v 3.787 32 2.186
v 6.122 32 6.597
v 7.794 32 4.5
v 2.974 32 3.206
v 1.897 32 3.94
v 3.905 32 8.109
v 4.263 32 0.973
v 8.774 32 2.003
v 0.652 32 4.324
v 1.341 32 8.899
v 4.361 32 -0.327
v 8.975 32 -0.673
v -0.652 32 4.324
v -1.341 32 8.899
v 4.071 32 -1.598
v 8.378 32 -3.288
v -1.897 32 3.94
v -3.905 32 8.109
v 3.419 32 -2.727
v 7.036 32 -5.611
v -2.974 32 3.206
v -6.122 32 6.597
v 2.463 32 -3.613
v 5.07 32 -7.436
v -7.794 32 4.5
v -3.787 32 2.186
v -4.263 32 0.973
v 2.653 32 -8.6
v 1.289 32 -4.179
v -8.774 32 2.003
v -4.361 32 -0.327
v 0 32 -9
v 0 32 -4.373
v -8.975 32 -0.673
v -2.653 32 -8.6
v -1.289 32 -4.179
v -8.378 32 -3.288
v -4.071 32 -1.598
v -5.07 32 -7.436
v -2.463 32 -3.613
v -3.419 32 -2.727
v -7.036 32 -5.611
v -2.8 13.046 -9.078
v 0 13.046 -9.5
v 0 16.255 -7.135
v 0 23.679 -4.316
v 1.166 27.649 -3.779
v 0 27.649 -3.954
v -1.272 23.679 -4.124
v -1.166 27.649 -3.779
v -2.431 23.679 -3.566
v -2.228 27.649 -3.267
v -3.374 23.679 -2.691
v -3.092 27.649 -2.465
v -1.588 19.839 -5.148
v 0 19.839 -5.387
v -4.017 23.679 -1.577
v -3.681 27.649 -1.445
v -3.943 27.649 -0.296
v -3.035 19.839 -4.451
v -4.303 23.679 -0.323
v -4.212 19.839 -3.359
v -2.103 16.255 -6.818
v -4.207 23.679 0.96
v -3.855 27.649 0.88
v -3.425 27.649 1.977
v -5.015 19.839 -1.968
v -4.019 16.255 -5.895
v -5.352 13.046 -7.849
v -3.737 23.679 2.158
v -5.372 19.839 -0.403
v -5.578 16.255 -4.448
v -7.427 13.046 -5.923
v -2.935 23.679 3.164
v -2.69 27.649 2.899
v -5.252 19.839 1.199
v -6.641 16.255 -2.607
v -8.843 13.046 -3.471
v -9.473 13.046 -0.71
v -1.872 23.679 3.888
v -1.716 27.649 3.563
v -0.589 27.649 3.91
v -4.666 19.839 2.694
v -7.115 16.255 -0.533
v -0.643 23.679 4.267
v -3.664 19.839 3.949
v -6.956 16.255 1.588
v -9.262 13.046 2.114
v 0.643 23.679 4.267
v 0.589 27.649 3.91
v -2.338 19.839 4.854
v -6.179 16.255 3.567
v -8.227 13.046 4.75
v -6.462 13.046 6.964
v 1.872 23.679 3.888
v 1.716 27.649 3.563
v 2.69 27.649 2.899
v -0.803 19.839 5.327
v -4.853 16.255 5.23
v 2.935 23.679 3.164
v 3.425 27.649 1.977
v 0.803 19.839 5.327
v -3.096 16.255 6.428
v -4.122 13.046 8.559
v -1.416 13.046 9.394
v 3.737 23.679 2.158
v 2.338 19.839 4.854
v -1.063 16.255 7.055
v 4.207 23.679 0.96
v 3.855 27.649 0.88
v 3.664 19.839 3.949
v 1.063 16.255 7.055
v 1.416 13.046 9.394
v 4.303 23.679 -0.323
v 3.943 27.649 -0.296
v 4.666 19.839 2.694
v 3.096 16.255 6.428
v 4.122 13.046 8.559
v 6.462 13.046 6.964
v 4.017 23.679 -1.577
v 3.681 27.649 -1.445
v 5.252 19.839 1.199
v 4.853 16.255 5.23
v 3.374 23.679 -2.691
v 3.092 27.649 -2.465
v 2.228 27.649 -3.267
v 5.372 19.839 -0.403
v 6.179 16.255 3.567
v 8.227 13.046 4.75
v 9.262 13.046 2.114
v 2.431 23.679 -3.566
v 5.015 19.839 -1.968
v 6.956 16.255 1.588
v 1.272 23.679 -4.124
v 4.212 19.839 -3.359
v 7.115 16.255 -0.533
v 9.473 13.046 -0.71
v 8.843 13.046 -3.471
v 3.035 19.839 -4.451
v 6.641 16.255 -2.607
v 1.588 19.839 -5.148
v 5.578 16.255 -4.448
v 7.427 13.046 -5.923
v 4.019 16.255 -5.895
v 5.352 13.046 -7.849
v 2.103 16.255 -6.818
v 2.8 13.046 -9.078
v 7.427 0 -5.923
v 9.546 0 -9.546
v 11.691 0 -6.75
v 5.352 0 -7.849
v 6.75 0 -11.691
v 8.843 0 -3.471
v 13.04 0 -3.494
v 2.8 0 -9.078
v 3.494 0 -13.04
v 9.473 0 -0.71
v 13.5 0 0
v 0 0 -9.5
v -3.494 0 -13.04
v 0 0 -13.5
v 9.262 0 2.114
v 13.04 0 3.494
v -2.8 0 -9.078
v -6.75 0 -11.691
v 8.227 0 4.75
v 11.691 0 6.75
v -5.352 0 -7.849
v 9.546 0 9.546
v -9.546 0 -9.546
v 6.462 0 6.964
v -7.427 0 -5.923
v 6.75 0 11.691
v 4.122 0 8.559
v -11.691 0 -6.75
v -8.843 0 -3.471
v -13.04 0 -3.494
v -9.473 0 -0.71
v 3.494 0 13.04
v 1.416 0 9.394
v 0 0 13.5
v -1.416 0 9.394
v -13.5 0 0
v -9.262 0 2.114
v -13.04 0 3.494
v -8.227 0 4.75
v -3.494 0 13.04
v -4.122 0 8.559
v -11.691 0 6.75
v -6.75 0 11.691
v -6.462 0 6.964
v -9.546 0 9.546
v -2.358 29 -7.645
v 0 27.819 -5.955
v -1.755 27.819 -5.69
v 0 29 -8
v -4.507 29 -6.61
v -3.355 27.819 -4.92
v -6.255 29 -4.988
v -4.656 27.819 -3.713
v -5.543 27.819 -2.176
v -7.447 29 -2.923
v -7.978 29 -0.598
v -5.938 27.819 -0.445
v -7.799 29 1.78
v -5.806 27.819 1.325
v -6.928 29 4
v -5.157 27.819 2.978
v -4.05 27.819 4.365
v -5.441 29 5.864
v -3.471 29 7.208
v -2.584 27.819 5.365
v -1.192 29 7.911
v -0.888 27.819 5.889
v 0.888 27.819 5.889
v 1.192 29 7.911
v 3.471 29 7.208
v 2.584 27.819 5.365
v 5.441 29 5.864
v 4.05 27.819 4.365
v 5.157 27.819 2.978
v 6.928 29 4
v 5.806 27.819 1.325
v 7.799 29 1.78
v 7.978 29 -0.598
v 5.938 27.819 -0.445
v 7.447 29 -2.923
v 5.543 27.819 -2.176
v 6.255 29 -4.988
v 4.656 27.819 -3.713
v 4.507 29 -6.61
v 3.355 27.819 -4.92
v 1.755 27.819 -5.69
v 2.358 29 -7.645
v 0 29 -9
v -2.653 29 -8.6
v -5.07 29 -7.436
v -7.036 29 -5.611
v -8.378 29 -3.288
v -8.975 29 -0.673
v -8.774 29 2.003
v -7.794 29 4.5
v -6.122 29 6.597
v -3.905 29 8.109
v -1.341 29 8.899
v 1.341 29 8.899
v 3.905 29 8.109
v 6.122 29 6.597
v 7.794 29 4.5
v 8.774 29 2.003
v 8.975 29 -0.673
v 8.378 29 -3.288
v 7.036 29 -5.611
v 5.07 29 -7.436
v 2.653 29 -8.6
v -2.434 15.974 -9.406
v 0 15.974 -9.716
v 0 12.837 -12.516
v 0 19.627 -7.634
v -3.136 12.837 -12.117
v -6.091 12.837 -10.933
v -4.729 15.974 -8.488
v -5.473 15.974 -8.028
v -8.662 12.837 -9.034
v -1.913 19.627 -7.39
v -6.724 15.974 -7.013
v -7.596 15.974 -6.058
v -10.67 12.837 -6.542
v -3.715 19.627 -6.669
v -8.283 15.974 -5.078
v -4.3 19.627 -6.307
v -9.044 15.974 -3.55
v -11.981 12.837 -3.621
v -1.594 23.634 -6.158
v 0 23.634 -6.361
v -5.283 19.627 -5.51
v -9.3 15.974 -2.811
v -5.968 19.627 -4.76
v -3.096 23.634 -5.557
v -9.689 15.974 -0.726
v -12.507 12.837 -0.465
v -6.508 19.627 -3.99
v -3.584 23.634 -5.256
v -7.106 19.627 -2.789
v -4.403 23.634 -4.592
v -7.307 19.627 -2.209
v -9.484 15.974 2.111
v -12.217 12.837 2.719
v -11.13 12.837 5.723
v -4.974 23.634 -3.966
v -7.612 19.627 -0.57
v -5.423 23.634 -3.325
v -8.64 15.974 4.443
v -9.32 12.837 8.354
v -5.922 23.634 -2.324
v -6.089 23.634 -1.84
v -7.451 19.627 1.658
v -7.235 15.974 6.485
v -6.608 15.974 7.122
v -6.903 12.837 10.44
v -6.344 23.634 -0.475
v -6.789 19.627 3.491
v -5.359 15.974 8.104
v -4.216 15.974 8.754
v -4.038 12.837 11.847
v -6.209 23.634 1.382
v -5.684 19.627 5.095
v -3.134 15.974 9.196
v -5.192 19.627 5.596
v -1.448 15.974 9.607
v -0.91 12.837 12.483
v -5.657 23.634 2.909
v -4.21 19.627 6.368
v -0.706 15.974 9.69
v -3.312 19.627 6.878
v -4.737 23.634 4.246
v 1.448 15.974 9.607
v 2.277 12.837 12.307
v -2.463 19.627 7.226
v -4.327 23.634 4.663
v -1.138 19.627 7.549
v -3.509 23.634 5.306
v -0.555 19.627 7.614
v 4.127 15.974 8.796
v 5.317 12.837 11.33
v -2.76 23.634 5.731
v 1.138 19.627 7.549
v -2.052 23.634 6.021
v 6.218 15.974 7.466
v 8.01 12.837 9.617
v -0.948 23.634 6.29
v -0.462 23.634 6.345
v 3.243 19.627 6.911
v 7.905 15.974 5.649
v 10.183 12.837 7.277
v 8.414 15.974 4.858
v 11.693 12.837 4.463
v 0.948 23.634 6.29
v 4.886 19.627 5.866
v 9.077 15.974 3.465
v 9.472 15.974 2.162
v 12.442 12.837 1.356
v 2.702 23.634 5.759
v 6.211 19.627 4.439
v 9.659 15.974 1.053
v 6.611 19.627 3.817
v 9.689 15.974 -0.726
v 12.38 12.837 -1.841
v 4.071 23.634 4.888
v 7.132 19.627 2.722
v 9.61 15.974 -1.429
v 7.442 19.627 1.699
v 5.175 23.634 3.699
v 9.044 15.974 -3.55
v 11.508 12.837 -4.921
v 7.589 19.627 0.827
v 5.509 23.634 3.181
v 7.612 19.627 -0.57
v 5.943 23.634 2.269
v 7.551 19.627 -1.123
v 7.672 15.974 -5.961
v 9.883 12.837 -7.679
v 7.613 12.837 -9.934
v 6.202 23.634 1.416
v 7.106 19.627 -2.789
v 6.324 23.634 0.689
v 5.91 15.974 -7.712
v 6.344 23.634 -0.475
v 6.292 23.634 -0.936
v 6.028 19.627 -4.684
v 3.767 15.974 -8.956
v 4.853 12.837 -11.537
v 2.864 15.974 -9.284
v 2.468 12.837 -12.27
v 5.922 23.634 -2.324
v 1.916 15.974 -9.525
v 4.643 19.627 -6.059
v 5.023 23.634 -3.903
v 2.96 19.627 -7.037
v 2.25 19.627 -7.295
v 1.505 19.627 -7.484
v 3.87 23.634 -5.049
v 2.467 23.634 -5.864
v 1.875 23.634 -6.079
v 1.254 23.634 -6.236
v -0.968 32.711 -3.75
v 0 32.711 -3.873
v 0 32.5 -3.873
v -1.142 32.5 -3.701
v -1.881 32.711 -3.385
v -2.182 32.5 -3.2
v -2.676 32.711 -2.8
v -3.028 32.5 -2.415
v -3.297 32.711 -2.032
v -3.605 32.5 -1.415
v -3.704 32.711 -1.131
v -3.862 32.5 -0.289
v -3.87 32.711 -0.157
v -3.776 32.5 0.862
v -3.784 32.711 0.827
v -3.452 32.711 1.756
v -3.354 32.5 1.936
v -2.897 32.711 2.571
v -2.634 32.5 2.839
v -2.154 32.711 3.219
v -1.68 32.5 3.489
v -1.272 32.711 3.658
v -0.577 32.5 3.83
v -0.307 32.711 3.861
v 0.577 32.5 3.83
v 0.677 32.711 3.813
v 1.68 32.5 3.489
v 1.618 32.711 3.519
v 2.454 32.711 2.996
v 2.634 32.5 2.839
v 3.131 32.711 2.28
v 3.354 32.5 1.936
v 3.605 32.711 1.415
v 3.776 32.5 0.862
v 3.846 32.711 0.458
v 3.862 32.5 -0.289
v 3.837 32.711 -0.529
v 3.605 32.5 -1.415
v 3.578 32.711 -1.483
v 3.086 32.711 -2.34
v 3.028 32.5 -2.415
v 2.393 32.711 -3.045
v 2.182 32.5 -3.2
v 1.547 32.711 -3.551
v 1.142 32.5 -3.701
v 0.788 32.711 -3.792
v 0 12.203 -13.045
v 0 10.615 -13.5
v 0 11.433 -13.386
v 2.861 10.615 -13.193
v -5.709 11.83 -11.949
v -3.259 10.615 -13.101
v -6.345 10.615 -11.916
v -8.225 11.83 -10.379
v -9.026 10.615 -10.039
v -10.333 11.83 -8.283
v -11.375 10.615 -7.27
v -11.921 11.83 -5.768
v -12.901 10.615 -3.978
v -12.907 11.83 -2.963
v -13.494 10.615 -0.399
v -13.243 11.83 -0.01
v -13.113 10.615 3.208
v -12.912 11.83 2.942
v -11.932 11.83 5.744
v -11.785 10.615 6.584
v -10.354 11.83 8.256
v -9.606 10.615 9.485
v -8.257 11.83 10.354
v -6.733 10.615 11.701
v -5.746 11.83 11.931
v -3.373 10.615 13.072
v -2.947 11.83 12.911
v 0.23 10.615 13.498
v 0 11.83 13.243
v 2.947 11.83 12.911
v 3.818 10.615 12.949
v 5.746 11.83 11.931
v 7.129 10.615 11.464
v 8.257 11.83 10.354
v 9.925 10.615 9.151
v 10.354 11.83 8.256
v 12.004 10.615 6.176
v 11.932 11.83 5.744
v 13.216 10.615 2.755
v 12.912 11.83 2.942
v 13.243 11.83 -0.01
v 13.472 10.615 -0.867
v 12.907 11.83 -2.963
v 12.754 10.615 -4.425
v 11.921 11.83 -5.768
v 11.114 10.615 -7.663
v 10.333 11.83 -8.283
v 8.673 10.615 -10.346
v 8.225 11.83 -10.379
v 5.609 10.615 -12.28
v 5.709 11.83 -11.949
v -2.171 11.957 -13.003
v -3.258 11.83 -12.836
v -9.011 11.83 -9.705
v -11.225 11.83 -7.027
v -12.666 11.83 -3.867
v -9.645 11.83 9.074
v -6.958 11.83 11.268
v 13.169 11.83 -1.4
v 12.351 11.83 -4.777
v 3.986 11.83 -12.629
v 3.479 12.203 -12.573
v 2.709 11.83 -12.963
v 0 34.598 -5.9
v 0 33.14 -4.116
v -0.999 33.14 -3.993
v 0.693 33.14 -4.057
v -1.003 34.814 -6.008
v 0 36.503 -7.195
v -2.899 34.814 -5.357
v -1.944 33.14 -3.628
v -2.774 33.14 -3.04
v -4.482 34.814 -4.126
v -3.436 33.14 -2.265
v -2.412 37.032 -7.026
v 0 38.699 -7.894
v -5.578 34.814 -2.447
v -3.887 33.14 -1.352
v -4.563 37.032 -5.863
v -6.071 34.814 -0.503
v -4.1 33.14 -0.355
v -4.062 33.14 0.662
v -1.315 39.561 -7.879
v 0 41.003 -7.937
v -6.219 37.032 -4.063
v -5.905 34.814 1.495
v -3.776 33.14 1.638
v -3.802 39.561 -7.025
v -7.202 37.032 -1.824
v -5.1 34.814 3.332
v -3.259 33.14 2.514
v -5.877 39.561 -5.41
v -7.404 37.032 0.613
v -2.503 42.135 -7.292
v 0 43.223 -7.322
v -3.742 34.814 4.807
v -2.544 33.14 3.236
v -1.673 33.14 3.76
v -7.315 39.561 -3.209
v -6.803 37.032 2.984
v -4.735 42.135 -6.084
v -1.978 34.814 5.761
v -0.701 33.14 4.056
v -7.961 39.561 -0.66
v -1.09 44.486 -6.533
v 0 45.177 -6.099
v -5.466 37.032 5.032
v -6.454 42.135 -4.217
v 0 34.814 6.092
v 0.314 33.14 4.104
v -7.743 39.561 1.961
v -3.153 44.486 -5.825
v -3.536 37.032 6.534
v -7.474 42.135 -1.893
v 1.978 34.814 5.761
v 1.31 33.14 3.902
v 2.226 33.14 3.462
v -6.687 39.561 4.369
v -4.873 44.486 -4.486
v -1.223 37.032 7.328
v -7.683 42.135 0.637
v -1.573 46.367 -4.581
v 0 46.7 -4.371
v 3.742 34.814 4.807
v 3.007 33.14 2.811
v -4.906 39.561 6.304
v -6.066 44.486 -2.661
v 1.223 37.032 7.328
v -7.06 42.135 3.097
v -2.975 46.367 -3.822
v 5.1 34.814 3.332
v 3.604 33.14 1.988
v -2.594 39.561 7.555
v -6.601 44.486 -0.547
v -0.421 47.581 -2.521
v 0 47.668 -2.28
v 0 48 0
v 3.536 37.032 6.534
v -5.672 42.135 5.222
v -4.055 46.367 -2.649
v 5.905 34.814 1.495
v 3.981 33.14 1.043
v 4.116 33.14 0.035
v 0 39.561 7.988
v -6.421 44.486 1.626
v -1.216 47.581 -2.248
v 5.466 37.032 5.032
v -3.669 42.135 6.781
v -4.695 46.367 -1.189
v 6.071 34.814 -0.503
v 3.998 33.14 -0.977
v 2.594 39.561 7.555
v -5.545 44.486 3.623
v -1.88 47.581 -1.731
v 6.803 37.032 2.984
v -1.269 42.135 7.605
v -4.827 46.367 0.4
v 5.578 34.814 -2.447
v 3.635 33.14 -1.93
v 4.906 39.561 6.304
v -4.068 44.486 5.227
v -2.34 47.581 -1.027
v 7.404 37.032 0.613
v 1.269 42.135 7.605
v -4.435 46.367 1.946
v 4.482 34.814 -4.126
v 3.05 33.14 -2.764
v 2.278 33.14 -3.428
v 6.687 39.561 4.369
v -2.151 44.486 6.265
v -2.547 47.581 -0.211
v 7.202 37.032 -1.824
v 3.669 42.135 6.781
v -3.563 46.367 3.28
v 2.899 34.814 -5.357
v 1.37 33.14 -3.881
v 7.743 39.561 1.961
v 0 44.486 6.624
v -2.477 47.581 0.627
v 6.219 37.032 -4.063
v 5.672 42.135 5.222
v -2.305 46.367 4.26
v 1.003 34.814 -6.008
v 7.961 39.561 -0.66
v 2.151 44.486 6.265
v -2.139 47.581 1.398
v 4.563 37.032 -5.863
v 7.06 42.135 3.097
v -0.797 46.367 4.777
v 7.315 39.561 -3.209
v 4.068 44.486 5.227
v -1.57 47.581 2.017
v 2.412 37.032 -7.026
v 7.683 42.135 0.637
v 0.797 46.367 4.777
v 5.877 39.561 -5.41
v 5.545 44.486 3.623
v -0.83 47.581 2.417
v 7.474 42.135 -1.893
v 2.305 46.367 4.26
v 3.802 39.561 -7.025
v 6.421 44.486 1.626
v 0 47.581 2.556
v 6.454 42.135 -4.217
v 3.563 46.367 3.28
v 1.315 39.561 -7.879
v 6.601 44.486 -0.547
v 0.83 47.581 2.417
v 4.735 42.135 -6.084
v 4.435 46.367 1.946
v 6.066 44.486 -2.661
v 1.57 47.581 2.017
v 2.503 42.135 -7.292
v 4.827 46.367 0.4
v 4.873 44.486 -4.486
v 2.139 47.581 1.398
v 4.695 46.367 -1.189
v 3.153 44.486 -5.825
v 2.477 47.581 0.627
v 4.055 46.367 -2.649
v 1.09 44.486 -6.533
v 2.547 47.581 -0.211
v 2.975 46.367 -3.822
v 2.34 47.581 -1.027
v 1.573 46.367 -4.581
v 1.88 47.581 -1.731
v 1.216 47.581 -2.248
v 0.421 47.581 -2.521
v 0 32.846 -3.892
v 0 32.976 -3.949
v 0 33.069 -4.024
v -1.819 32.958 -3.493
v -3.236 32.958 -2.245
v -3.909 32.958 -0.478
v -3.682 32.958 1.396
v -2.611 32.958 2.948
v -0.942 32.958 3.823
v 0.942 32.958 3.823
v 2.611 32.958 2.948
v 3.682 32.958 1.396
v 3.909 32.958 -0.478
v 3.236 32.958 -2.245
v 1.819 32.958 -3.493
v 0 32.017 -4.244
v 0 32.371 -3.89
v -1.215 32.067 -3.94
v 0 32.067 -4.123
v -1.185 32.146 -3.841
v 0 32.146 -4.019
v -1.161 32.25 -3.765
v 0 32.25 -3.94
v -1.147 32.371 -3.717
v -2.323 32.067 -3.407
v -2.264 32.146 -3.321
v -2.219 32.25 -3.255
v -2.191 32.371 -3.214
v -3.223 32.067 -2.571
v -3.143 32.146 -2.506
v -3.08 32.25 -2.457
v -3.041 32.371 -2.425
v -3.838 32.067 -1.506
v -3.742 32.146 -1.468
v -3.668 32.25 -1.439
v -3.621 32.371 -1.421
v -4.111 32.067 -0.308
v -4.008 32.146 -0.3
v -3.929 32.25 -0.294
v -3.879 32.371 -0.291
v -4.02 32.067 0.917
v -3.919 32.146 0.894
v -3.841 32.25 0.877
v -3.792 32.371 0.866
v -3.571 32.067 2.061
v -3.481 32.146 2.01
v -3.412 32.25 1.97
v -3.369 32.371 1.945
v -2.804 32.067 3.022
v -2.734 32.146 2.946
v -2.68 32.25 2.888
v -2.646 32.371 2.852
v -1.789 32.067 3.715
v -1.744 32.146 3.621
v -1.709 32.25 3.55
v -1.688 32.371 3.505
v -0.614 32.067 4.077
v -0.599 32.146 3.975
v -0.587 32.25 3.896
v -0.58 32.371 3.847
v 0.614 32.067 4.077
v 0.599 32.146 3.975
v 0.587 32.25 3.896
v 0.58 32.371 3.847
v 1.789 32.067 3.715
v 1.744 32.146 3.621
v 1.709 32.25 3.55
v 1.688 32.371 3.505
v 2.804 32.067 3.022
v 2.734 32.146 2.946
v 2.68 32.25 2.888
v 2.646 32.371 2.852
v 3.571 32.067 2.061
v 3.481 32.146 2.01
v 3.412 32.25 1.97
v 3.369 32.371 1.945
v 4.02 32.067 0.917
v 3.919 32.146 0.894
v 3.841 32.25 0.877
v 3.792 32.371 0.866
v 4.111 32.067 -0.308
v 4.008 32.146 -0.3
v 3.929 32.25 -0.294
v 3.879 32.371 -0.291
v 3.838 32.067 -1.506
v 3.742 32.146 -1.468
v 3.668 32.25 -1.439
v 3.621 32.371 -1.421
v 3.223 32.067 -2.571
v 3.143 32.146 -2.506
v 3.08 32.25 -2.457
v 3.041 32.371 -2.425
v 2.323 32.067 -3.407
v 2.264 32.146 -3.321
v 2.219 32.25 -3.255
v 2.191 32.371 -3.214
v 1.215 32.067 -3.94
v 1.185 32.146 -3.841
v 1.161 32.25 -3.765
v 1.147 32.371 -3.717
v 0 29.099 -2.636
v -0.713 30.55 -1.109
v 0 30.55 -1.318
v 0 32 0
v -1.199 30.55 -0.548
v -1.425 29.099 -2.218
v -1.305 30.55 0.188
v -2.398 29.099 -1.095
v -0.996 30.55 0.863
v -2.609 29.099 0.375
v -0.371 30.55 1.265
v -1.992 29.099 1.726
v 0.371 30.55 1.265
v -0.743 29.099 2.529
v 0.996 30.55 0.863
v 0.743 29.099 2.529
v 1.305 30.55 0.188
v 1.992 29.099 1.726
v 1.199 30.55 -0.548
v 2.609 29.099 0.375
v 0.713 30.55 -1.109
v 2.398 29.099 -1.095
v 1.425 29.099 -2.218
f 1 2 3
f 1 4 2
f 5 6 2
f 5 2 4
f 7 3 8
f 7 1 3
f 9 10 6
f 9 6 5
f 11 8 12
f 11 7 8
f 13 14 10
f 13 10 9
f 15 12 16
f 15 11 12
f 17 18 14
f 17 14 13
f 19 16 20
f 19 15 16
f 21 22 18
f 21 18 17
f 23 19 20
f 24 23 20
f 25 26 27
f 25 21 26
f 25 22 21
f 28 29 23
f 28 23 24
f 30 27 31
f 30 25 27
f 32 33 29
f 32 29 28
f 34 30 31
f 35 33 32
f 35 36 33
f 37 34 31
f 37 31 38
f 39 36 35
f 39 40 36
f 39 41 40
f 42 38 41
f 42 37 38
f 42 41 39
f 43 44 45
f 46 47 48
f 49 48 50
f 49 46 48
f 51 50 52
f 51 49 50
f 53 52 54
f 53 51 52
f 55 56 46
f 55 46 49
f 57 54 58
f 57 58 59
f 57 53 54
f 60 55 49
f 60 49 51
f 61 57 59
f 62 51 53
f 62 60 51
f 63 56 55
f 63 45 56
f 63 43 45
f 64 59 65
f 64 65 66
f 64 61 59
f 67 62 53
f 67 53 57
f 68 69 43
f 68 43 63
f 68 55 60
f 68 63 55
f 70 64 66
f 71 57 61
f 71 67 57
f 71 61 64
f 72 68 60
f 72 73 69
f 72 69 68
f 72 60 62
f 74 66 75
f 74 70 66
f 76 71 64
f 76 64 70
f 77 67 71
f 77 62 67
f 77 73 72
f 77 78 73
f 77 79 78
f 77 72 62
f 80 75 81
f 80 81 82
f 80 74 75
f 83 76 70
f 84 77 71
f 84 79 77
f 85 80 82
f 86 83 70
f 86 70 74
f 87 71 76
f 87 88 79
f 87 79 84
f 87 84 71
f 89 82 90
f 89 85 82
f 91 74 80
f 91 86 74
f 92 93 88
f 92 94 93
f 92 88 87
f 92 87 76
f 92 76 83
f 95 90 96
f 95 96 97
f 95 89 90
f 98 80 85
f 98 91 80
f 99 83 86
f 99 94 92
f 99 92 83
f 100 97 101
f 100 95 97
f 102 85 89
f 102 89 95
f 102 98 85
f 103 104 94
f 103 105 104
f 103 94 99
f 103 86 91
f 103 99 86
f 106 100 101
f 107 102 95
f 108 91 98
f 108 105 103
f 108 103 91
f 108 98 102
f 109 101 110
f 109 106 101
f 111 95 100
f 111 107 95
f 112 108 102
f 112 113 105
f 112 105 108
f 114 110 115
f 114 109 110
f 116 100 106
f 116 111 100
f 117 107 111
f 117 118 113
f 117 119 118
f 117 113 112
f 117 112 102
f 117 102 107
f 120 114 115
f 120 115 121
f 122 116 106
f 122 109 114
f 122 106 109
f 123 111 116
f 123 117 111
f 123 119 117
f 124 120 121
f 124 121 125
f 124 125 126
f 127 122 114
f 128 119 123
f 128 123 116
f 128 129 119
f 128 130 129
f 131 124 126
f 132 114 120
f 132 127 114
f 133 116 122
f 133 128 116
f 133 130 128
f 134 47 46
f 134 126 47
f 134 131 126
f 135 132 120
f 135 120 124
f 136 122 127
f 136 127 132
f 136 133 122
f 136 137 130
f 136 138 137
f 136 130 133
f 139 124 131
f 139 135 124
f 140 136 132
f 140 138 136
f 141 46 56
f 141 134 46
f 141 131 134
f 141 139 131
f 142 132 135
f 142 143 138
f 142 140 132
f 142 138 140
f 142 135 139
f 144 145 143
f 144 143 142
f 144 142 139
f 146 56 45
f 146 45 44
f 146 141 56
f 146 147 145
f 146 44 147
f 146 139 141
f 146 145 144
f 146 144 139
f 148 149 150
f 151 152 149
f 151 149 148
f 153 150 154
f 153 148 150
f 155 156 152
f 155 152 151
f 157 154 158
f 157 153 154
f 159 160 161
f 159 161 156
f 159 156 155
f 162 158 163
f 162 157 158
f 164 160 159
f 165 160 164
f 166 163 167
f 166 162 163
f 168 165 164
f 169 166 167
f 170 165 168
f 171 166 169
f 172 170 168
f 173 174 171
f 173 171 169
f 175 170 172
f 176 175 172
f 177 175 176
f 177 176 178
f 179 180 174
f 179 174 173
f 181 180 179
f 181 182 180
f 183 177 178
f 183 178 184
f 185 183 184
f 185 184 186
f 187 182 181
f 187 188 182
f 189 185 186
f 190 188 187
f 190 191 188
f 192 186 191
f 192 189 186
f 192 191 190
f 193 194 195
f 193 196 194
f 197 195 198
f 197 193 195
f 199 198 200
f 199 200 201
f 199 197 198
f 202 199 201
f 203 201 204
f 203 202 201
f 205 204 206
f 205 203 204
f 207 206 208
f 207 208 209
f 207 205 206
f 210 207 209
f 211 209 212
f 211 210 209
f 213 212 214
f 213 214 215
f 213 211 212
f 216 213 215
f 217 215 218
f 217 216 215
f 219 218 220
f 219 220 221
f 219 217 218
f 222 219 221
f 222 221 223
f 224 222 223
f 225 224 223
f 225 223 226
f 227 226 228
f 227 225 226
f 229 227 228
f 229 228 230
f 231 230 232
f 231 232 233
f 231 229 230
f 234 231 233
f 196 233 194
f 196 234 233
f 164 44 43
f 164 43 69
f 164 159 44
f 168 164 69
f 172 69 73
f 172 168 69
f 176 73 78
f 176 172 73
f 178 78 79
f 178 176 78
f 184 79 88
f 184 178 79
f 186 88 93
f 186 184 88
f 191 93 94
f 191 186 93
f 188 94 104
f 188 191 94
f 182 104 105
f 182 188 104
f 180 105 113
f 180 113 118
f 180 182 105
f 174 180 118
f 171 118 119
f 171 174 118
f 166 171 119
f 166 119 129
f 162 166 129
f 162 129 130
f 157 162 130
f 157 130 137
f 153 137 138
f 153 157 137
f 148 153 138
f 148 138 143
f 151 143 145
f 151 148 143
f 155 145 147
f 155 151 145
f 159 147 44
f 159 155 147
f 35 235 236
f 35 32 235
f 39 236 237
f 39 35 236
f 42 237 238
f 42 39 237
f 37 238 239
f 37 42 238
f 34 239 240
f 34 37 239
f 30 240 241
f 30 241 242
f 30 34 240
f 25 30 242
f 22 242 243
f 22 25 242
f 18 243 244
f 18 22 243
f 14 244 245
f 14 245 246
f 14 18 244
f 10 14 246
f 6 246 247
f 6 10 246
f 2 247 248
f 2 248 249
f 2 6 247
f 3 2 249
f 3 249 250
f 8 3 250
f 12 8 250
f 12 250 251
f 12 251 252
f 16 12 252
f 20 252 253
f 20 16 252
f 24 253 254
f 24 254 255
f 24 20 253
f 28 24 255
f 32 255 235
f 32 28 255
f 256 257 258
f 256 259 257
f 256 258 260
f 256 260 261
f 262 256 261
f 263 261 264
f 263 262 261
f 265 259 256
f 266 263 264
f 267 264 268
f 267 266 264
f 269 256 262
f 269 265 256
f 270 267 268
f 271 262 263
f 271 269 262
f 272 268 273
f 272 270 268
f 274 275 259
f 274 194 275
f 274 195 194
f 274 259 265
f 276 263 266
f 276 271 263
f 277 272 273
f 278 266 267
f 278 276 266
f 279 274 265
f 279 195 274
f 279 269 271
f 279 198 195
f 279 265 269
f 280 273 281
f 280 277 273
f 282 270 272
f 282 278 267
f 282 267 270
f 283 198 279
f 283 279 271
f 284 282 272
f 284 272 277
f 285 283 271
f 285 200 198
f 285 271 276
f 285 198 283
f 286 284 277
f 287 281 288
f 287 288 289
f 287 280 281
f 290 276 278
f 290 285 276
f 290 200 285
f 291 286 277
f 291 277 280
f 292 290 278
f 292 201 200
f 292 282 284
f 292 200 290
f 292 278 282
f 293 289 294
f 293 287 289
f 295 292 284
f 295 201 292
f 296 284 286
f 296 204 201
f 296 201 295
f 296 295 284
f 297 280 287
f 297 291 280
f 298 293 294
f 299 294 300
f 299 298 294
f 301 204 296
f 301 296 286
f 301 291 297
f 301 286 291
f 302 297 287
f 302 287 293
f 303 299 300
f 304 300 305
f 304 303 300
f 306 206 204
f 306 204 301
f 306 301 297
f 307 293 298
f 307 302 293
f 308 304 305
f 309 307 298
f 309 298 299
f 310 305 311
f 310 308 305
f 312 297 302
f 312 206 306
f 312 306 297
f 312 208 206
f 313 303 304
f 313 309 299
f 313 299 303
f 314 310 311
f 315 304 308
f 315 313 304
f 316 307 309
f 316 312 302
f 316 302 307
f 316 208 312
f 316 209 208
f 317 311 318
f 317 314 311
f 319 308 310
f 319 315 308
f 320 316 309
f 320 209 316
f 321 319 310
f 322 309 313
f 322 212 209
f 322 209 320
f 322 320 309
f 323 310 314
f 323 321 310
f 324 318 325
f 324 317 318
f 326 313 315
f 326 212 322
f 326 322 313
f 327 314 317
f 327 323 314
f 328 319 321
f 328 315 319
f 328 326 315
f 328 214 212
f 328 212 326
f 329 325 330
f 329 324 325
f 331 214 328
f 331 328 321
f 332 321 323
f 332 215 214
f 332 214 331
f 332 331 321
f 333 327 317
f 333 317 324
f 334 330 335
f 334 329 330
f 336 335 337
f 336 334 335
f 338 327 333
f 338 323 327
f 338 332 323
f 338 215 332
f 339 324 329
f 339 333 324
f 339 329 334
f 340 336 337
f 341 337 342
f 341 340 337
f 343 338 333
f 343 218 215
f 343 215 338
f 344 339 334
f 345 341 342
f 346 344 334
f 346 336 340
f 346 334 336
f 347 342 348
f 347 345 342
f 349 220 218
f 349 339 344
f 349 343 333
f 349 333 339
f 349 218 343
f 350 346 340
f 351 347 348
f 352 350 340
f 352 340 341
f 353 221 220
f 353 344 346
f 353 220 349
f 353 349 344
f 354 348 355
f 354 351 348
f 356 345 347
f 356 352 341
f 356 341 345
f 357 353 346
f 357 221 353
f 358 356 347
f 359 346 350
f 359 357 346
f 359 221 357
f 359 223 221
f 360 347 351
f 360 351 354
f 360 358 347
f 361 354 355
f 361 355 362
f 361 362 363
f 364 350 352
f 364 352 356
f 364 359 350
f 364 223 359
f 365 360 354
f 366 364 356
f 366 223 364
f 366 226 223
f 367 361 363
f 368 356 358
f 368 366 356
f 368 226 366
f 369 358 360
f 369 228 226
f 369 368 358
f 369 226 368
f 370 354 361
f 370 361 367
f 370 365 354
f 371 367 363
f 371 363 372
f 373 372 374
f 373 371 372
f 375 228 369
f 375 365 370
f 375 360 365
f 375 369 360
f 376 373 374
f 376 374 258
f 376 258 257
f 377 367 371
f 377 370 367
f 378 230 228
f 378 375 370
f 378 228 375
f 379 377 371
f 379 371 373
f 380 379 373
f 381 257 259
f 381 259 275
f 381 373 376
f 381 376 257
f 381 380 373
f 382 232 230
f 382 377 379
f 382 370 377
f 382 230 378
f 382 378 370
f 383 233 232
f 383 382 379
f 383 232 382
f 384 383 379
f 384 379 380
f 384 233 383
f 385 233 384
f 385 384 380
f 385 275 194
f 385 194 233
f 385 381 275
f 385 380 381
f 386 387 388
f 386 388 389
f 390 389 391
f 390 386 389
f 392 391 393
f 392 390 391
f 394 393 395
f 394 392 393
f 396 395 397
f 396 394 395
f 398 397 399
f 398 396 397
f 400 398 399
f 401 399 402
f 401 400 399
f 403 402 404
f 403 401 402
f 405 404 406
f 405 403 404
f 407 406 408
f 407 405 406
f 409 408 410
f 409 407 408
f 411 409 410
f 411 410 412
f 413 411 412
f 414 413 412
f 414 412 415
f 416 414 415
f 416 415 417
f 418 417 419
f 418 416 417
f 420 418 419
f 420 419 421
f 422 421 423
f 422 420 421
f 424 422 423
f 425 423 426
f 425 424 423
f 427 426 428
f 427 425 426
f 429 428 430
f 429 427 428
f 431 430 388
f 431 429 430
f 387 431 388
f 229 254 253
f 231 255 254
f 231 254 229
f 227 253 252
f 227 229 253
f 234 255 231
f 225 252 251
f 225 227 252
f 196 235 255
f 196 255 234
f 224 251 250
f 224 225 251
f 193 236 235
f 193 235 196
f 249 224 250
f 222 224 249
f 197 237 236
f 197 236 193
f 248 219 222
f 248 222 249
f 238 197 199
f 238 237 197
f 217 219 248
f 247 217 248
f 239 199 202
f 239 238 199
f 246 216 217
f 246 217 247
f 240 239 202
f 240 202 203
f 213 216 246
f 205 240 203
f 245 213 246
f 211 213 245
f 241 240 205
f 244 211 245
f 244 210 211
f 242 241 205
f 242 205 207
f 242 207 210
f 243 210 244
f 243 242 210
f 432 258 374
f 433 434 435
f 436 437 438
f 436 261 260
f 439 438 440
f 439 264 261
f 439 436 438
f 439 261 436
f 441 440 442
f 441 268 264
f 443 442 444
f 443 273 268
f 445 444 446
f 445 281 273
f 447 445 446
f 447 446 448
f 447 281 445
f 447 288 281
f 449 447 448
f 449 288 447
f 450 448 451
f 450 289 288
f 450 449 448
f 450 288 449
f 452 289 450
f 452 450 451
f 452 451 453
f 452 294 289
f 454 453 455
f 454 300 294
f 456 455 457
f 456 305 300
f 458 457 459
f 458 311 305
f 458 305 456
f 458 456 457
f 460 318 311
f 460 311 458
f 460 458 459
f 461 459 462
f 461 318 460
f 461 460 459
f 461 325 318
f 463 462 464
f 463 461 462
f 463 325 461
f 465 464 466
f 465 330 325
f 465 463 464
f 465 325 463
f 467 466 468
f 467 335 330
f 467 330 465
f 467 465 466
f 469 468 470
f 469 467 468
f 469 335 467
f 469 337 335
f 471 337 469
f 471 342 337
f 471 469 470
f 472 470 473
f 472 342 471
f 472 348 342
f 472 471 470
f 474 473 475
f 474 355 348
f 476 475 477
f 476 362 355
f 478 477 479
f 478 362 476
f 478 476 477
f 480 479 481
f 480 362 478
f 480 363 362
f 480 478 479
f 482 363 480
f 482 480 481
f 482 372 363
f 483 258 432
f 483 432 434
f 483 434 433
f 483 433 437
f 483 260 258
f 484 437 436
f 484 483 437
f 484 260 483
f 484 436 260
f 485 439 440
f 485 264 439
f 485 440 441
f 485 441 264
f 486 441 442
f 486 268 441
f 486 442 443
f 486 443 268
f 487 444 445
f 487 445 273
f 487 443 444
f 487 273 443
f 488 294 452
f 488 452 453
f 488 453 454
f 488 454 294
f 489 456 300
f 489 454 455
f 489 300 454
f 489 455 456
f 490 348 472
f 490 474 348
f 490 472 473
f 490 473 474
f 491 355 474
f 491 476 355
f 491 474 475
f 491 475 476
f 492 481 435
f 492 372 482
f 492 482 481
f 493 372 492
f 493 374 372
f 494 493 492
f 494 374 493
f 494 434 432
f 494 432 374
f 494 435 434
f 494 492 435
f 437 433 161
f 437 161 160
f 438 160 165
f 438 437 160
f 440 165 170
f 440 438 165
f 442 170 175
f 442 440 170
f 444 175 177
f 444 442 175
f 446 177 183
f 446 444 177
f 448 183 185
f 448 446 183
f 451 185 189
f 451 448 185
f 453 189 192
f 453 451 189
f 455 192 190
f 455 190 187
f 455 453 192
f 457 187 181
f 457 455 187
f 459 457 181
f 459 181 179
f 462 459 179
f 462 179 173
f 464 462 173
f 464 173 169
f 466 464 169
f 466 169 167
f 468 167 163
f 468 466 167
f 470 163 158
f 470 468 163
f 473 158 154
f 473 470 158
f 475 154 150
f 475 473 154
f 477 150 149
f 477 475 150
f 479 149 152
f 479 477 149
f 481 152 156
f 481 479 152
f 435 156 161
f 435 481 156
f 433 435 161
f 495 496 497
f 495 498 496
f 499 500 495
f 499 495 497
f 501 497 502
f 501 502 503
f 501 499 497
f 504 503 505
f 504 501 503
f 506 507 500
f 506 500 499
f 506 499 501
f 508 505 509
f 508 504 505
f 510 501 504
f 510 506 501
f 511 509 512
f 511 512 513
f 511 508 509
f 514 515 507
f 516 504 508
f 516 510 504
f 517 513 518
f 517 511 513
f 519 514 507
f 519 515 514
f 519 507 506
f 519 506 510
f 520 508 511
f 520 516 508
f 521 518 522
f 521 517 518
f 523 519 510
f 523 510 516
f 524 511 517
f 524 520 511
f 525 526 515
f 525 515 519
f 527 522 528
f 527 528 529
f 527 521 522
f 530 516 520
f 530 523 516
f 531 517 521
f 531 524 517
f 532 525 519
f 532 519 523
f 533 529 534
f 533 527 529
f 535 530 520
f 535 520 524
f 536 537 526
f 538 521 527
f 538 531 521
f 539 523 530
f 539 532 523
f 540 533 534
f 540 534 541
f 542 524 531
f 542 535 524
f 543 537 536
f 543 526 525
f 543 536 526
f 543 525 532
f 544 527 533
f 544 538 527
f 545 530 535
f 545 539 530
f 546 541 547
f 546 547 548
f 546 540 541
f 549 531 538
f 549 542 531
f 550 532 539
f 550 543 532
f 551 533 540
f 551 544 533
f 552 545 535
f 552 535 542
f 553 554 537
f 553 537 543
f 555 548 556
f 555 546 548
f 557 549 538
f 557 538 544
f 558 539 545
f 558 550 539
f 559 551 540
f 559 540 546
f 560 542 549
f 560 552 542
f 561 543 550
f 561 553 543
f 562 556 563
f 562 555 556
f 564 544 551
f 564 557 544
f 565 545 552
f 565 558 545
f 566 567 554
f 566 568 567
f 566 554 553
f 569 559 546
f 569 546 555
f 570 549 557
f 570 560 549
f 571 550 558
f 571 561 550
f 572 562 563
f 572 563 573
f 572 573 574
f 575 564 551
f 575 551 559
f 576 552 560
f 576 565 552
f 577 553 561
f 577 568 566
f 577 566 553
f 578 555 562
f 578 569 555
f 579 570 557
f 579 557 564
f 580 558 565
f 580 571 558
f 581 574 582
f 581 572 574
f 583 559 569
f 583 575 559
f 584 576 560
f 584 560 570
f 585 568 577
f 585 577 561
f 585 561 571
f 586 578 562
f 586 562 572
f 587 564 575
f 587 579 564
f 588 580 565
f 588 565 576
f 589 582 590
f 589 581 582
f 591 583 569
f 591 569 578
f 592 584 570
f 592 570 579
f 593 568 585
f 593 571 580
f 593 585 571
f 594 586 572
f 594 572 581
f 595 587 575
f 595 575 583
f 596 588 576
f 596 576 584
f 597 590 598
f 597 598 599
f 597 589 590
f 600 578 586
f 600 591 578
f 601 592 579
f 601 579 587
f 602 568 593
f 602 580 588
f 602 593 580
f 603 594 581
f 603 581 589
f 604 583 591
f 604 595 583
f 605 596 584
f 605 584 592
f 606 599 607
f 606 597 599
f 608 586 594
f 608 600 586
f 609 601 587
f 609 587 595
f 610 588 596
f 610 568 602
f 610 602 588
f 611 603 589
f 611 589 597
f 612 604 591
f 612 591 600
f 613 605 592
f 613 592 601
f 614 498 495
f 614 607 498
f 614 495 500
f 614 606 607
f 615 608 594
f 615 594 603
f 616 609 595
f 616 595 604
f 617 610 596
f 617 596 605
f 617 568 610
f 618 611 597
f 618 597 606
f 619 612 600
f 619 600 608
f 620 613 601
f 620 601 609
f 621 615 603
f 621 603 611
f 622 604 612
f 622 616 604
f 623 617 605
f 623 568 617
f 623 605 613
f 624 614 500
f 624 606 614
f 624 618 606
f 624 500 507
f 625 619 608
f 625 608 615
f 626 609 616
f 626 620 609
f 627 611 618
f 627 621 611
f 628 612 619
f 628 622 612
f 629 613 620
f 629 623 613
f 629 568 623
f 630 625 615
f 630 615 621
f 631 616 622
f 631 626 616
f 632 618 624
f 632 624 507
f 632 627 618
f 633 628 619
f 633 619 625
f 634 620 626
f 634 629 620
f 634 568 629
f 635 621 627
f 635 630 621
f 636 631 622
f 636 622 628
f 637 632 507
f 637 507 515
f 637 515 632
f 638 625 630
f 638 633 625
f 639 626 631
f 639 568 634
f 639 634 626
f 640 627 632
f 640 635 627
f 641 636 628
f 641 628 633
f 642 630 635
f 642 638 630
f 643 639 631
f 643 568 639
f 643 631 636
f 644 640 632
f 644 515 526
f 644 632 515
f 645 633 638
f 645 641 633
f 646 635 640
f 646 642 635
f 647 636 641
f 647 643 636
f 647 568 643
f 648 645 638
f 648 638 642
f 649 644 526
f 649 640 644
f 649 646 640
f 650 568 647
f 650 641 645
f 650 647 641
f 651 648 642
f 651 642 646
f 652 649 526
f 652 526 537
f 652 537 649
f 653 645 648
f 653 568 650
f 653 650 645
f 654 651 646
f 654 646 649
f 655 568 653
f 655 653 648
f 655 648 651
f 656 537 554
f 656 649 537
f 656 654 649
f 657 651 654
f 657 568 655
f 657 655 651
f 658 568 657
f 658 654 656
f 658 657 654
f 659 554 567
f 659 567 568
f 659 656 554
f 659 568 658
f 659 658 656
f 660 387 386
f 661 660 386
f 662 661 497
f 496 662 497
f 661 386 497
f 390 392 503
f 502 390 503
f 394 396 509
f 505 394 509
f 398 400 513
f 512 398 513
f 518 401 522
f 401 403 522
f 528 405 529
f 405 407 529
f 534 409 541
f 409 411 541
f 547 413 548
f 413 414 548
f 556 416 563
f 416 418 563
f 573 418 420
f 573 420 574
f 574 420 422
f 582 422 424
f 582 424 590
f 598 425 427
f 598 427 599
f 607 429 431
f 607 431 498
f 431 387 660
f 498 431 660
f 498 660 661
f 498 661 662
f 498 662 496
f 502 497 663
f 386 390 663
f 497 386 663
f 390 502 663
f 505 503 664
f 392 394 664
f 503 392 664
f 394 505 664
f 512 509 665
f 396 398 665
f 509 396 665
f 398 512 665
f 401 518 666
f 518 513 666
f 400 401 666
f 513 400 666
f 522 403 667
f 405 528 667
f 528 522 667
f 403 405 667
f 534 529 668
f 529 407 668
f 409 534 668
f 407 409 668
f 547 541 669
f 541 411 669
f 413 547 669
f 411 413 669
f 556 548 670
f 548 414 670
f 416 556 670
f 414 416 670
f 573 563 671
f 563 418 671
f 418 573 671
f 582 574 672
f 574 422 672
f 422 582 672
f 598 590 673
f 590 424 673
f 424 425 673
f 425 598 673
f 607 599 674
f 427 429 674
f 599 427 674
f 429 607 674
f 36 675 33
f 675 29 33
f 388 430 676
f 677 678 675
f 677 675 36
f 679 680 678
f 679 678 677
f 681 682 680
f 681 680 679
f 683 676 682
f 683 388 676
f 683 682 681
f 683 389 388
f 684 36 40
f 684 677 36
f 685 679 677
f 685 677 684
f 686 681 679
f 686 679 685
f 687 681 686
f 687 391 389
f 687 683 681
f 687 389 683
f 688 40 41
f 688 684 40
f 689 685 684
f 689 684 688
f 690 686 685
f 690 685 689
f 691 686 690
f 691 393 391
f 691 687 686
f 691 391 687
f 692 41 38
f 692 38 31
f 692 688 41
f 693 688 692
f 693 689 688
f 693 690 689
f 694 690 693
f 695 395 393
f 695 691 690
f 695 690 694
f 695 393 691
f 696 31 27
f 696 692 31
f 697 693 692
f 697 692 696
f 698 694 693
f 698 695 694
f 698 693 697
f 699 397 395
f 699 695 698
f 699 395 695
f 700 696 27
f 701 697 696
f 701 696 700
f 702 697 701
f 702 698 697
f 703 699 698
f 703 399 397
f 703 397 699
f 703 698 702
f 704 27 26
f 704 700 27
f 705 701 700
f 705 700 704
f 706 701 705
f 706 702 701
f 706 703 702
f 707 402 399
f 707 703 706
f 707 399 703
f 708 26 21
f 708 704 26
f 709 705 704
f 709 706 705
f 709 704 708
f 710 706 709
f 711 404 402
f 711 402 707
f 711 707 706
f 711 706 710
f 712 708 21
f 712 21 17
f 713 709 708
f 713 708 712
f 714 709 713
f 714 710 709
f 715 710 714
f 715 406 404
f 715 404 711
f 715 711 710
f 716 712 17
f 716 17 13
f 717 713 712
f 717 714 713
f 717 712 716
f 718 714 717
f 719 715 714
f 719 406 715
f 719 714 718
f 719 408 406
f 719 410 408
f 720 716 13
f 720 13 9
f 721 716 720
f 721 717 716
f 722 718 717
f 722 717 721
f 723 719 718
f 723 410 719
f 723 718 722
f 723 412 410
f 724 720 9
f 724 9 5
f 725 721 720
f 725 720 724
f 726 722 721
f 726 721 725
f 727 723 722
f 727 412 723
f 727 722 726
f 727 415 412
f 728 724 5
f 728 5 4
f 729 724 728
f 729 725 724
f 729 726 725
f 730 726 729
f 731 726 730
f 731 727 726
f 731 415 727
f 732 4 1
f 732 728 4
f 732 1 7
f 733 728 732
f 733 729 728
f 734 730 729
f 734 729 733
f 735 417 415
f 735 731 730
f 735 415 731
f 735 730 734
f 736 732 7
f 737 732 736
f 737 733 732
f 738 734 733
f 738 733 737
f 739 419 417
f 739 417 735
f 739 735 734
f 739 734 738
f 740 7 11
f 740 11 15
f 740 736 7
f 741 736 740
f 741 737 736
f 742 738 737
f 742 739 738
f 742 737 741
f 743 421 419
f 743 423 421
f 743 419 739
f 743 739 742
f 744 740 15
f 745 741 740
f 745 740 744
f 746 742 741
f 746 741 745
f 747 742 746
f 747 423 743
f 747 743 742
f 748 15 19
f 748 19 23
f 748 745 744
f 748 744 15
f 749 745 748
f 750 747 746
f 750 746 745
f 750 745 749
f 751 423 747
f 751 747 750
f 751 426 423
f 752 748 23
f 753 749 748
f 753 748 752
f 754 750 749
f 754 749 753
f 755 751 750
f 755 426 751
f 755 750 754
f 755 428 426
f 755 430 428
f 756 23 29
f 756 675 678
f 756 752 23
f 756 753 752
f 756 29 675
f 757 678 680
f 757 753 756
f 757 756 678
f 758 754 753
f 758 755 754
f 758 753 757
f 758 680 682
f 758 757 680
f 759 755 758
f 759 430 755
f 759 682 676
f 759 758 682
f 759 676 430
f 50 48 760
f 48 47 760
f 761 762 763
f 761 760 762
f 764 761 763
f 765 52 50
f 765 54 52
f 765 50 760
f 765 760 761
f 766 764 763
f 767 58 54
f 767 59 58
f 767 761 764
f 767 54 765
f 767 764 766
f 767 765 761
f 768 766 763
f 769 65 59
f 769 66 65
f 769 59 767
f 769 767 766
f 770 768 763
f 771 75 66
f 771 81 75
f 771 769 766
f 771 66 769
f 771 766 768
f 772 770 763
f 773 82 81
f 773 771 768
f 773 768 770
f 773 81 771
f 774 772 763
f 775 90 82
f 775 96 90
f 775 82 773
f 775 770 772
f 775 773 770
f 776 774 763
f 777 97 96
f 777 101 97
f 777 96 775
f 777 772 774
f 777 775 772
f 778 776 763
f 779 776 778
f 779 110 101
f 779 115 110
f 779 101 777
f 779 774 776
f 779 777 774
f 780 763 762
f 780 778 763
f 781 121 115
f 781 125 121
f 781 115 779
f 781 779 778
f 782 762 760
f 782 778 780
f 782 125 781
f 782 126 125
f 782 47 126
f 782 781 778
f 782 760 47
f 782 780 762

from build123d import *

# Parameters (mm, degrees)
CHAMFER1_SIZE = 2
FILLET1_R     = 3
FILLET2_R     = 0.5


with BuildPart() as part:
    # Sketch1 → Revolve1 (revolve)
    with BuildSketch(Plane.XY, mode=Mode.PRIVATE) as revolve1_sk:
        with BuildLine():
            Line((9.5, 13.045692134), (9.5, 0))
            Line((9.5, 0), (13.5, 0))
            Line((13.5, 0), (13.5, 12))
            ThreePointArc((13.5, 12), (7.655959241, 19.576158489), (6, 29))
            Line((6, 29), (9, 29))
            Line((9, 29), (9, 32))
            Line((9, 32), (3.872983346, 32))
            Line((3.872983346, 32), (3.872983346, 33))
            ThreePointArc((3.872983346, 33), (7.745966692, 42), (0, 48))
            Line((0, 48), (0, 40))
            Line((0, 40), (0, 37))
            Line((0, 37), (0, 34.783882181))
            Line((0, 34.783882181), (0, 32))
            Line((0, 32), (3.954315273, 27.64896262))
            ThreePointArc((3.954315273, 27.64896262), (5.387413027, 19.838550851), (9.5, 13.045692134))
        make_face()
    revolve(revolve1_sk.sketch.rotate(Axis((0, 37, 0), (0, 1, 0)), 90), axis=Axis((0, 37, 0), (0, 1, 0)))

    # Chamfer1
    # the kernel refuses this chamfer: 2, 1.204425644 mm, written as the material it adds along each edge
    with BuildSketch(Plane(origin=(0, 29, 0), x_dir=(0, 0, -1), z_dir=(1, 0, 0))) as chamfer1_piece_1:
        with BuildLine():
            Line((5.955041017, -1.180657619), (6 + CHAMFER1_SIZE, 0))
            Line((6 + CHAMFER1_SIZE, 0), (6, 0))
            ThreePointArc((6, 0), (5.968001768, -0.611258692), (5.955041017, -1.180657619))
        make_face()
    revolve(axis=Axis((0, 29, 0), (0, 1, 0)))

    # Fillet1
    fillet1_edges = [part.edges().sort_by_distance(p)[0] for p in [
        (0, 12, 13.5),
    ]]
    fillet(fillet1_edges, radius=FILLET1_R)

    # Fillet2
    fillet2_edges = [part.edges().sort_by_distance(p)[0] for p in [
        (0, 33, 3.872983346),
        (0, 32, 3.872983346),
    ]]
    fillet(fillet2_edges, radius=FILLET2_R)


solid = part.part
